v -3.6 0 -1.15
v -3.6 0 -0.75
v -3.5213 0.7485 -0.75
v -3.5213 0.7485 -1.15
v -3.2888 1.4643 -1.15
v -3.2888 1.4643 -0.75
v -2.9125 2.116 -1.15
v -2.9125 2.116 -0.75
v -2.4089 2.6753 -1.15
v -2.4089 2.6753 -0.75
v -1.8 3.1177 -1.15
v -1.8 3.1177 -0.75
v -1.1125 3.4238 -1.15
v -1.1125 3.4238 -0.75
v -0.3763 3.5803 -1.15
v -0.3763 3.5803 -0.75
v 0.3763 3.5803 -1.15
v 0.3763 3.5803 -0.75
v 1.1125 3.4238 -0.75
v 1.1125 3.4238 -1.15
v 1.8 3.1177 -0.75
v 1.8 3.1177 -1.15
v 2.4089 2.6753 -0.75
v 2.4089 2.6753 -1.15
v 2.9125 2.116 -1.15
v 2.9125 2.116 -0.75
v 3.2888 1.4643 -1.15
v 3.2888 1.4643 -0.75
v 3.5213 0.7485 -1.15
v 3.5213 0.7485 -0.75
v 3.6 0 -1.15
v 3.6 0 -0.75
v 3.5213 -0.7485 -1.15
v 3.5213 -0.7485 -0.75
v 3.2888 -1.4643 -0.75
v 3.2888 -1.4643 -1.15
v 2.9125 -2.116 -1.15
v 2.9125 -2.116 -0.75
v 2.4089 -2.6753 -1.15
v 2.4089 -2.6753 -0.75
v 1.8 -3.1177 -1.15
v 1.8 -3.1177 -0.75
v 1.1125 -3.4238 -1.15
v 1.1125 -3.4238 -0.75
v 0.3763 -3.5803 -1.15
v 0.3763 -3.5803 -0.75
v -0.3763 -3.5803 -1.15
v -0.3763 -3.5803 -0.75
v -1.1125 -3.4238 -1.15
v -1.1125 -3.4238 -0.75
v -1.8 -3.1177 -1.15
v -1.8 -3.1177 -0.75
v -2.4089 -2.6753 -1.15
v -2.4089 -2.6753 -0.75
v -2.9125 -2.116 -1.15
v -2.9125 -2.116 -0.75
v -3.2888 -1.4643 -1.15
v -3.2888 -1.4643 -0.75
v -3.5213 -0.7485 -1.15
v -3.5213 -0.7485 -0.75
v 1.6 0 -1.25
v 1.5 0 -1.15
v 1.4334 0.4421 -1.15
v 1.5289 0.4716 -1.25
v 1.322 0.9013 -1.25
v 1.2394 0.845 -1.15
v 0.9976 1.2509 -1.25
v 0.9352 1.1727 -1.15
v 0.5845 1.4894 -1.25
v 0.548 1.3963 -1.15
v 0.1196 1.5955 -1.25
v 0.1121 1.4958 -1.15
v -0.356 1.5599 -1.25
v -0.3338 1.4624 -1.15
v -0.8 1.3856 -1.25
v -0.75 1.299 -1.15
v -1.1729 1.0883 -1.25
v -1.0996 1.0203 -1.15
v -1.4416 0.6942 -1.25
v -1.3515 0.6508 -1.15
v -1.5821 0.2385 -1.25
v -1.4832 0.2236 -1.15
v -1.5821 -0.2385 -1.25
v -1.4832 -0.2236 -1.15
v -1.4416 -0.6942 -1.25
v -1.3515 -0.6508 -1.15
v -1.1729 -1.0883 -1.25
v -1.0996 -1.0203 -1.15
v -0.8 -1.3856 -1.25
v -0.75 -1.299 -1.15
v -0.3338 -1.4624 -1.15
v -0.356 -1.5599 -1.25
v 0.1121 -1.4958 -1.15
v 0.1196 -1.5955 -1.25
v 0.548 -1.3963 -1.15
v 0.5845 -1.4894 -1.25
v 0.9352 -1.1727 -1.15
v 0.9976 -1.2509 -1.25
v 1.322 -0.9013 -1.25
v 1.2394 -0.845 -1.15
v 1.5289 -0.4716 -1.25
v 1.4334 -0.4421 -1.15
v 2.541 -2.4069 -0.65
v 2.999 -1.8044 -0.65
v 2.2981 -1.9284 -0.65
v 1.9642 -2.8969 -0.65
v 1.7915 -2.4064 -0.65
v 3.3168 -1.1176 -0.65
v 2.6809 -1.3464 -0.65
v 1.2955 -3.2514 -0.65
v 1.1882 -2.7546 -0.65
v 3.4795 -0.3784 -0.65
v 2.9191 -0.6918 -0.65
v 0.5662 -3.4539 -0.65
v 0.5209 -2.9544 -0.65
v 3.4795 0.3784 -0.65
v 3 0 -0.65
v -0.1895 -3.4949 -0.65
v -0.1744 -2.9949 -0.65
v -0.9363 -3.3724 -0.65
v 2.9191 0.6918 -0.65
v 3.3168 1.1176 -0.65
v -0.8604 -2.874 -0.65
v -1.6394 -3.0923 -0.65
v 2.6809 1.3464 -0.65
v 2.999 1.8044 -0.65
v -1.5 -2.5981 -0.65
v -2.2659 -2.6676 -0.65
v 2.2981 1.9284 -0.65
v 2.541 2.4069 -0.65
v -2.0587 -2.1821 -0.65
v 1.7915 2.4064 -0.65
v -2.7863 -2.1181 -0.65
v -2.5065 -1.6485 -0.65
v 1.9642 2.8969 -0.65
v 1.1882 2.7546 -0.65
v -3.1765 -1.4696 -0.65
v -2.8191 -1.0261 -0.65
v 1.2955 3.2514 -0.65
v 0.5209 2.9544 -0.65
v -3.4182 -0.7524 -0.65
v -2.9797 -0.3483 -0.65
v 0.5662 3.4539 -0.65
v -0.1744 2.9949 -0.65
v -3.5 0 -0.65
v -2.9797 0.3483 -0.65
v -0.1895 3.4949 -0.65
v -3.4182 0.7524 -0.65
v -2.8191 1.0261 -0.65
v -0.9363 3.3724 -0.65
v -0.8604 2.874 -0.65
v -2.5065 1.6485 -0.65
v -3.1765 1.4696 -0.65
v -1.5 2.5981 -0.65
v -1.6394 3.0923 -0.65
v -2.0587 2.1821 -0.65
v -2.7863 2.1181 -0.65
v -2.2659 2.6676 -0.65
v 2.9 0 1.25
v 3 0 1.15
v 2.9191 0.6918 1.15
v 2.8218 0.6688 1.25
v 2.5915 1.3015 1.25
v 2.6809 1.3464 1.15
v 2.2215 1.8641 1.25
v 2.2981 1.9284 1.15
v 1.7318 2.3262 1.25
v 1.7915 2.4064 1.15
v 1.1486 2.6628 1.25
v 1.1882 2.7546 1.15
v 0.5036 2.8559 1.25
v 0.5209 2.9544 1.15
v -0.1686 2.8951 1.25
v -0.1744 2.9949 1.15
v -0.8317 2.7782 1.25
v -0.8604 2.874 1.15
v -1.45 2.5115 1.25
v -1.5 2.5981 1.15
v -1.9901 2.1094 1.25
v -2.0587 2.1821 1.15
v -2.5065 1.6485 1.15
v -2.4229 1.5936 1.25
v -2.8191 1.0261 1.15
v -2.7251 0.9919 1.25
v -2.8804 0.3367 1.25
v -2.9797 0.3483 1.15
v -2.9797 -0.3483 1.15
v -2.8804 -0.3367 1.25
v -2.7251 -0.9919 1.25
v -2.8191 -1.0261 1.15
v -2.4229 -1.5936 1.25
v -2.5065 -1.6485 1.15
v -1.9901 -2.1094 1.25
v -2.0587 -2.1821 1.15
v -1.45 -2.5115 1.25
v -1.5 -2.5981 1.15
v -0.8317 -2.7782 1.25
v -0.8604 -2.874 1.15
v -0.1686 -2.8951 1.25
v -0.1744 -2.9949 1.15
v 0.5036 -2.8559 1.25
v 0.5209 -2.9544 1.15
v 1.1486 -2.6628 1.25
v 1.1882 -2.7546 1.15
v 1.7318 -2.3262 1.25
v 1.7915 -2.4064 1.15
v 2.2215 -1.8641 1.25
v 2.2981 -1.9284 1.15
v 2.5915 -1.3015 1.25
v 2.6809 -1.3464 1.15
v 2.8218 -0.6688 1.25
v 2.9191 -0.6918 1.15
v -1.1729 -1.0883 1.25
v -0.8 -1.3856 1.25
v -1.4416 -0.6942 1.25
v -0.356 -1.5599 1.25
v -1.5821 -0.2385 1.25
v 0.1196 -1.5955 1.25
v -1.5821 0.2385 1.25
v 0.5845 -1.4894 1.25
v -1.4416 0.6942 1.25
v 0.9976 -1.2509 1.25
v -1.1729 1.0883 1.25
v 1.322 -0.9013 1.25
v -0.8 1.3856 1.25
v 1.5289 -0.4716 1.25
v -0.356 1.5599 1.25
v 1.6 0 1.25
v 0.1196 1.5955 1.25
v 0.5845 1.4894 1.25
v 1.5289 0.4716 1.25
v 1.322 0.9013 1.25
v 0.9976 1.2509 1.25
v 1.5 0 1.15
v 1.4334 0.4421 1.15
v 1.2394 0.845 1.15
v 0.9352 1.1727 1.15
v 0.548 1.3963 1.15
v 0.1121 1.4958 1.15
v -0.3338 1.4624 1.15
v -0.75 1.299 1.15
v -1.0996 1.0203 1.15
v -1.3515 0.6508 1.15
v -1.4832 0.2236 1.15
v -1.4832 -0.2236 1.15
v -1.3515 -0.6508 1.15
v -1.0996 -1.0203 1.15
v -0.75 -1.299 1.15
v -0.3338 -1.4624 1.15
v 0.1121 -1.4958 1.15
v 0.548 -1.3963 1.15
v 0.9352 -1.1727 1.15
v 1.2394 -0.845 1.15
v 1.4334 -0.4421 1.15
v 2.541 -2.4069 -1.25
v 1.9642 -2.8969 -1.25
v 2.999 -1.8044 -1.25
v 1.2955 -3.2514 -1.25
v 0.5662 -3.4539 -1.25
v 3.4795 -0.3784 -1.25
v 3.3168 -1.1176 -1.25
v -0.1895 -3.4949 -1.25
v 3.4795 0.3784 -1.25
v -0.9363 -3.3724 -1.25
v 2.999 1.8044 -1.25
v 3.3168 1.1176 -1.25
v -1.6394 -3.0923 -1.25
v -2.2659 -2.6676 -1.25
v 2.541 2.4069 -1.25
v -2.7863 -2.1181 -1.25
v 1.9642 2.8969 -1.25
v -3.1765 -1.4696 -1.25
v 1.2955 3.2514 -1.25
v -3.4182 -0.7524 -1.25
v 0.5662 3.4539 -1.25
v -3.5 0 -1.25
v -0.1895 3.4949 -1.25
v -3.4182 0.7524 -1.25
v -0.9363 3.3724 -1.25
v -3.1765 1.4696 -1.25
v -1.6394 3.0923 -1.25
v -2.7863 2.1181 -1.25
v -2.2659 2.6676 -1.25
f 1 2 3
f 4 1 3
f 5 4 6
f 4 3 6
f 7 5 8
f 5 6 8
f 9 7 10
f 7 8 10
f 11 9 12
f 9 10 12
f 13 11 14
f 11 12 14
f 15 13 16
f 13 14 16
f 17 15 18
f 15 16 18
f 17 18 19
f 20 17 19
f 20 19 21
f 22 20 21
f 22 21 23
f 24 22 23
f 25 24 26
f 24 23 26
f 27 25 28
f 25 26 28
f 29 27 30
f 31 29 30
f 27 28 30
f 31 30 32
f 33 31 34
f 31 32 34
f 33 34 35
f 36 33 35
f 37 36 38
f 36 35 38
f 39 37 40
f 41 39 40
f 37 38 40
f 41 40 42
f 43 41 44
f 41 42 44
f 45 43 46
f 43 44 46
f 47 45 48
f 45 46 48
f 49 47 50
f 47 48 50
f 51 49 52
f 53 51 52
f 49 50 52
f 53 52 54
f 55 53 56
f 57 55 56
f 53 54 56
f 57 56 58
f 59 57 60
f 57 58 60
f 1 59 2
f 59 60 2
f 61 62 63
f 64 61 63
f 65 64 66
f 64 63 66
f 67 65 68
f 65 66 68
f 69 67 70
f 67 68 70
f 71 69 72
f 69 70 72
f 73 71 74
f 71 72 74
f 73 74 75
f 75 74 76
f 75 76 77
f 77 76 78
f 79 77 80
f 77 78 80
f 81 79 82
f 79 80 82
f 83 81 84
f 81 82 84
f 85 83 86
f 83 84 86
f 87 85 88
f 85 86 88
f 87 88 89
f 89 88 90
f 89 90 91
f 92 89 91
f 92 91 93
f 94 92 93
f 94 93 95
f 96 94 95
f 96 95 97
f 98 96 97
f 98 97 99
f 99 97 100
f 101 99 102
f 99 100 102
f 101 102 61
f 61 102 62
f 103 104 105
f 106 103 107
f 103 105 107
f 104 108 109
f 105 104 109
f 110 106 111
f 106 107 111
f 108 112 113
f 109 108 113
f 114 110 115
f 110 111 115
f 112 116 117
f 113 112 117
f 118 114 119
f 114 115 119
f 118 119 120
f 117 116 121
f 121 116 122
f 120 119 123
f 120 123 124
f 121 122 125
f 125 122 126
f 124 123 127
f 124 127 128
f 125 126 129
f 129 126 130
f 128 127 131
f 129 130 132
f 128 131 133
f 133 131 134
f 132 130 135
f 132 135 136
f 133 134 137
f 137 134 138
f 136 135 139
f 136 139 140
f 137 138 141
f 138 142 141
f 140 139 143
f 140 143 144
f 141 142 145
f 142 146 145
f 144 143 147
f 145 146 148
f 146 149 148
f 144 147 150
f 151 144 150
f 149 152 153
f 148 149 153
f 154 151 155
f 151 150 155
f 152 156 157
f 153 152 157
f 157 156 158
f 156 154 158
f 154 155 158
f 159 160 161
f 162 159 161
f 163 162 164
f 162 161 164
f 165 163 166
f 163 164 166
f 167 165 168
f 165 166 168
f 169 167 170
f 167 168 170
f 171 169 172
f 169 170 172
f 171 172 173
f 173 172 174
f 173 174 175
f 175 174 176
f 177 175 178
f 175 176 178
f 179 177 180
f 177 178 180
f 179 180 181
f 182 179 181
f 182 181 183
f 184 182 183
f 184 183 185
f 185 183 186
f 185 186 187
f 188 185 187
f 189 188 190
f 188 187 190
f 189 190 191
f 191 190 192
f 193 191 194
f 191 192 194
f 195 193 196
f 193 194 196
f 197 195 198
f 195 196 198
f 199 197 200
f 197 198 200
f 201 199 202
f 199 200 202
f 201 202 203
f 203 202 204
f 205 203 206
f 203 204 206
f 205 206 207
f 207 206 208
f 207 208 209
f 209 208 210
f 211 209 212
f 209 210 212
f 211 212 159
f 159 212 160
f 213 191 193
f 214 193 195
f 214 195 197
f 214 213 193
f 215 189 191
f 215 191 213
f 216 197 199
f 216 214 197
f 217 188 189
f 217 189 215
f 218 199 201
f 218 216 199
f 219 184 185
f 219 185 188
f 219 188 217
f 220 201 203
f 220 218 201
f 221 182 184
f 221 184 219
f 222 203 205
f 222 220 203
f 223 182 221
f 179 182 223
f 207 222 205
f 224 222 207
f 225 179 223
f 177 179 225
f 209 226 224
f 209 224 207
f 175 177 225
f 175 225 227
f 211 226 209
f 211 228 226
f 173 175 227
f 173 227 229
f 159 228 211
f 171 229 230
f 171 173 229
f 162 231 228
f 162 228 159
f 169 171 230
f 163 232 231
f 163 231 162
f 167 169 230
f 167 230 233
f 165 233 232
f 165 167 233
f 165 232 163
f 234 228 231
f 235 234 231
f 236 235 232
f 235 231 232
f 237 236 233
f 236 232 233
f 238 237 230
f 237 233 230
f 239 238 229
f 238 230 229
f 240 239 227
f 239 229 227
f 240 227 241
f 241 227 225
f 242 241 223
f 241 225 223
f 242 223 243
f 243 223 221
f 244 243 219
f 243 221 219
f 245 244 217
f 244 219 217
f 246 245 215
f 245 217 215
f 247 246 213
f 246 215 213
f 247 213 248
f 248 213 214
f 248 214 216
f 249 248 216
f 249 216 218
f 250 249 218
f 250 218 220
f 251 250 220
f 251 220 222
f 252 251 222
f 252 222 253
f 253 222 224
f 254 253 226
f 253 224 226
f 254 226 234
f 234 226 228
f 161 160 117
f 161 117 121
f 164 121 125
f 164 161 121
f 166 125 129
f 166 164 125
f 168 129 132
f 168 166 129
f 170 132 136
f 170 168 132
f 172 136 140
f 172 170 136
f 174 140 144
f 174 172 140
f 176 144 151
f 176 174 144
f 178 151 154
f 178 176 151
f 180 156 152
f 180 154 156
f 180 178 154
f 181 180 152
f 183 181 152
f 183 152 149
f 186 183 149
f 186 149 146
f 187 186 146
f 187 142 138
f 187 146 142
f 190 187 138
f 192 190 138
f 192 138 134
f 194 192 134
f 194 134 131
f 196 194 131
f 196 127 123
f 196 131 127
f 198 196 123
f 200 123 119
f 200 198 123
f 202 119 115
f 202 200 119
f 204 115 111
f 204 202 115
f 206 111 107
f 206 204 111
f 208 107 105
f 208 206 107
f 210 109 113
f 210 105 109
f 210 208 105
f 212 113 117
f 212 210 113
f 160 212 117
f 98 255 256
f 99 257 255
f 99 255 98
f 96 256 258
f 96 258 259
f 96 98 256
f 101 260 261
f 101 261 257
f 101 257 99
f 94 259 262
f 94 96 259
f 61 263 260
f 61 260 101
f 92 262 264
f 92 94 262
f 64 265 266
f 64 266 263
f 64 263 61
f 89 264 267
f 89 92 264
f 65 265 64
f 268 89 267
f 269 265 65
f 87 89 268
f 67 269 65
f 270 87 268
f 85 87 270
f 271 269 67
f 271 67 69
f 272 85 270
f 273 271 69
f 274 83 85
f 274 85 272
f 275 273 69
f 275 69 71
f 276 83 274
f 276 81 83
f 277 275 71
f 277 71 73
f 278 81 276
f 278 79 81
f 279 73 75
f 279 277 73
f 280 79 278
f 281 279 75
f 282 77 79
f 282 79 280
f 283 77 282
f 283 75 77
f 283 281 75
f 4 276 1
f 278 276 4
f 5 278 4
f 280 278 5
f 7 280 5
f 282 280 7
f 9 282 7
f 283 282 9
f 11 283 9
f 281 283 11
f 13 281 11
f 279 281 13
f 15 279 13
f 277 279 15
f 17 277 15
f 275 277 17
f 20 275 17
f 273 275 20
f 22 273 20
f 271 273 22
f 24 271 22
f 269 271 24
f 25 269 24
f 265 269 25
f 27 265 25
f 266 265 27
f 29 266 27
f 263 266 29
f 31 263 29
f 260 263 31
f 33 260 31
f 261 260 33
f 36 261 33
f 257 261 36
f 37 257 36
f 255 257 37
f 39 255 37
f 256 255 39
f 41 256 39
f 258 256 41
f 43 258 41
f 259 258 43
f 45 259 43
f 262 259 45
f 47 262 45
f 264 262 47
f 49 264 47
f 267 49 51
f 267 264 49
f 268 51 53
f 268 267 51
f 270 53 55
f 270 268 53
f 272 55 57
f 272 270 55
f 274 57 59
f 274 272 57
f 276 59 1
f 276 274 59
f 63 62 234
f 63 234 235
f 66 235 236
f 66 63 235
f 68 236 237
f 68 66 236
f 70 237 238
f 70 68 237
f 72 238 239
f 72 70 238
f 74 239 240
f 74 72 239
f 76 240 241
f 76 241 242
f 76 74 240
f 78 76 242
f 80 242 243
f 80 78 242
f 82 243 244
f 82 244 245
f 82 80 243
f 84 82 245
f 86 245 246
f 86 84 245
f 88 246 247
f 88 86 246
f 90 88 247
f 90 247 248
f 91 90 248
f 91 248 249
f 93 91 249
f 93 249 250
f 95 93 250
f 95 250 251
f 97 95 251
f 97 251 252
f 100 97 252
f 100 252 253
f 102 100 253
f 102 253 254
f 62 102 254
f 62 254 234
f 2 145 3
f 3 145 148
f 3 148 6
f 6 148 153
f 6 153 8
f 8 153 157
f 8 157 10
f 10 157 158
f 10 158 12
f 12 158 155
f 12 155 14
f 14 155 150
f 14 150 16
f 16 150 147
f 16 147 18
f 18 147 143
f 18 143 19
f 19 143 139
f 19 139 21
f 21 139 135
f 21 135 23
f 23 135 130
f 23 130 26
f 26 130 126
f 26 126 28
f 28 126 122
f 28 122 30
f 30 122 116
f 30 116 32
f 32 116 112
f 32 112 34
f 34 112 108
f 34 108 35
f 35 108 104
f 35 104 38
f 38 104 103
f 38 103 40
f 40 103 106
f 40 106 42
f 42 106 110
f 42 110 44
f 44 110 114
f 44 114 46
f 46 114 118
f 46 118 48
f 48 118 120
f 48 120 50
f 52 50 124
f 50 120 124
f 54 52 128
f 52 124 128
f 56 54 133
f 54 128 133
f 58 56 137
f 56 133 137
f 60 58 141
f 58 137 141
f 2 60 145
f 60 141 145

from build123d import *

# Parameters (mm, degrees)
SKETCH_1_R      = 3
SKETCH_1_R_2    = 1.5
EXTRUDE_1_DEPTH = 1.25
EXTRUDE_START   = -0.6
SKETCH_2_R      = 3.6
SKETCH_2_R_2    = 3
EXTRUDE_2_DEPTH = 0.6
CHAMFER_1_SIZE  = 0.1


with BuildPart() as part:
    # 草图1 → 凸台-拉伸1 (new, symmetric)
    with BuildSketch(Plane.XY):
        Circle(SKETCH_1_R)
        Circle(SKETCH_1_R_2, mode=Mode.SUBTRACT)
    extrude(amount=EXTRUDE_1_DEPTH, both=True)

    # 草图2 → 凸台-拉伸2 (add)
    with BuildSketch(Plane(origin=(0, 0, -1.25), x_dir=(-1, 0, 0), z_dir=(0, 0, -1)).offset(EXTRUDE_START)):
        Circle(SKETCH_2_R)
        Circle(SKETCH_2_R_2, mode=Mode.SUBTRACT)
    extrude(amount=EXTRUDE_2_DEPTH)

    # 倒角1
    chamfer_1_edges = [part.edges().sort_by_distance(p)[0] for p in [
        (3.6, 0, -0.65),
        (3.6, 0, -1.25),
        (-3, 0, 1.25),
        (-1.5, 0, -1.25),
        (-1.5, 0, 1.25),
    ]]
    chamfer(chamfer_1_edges, length=CHAMFER_1_SIZE)


solid = part.part
